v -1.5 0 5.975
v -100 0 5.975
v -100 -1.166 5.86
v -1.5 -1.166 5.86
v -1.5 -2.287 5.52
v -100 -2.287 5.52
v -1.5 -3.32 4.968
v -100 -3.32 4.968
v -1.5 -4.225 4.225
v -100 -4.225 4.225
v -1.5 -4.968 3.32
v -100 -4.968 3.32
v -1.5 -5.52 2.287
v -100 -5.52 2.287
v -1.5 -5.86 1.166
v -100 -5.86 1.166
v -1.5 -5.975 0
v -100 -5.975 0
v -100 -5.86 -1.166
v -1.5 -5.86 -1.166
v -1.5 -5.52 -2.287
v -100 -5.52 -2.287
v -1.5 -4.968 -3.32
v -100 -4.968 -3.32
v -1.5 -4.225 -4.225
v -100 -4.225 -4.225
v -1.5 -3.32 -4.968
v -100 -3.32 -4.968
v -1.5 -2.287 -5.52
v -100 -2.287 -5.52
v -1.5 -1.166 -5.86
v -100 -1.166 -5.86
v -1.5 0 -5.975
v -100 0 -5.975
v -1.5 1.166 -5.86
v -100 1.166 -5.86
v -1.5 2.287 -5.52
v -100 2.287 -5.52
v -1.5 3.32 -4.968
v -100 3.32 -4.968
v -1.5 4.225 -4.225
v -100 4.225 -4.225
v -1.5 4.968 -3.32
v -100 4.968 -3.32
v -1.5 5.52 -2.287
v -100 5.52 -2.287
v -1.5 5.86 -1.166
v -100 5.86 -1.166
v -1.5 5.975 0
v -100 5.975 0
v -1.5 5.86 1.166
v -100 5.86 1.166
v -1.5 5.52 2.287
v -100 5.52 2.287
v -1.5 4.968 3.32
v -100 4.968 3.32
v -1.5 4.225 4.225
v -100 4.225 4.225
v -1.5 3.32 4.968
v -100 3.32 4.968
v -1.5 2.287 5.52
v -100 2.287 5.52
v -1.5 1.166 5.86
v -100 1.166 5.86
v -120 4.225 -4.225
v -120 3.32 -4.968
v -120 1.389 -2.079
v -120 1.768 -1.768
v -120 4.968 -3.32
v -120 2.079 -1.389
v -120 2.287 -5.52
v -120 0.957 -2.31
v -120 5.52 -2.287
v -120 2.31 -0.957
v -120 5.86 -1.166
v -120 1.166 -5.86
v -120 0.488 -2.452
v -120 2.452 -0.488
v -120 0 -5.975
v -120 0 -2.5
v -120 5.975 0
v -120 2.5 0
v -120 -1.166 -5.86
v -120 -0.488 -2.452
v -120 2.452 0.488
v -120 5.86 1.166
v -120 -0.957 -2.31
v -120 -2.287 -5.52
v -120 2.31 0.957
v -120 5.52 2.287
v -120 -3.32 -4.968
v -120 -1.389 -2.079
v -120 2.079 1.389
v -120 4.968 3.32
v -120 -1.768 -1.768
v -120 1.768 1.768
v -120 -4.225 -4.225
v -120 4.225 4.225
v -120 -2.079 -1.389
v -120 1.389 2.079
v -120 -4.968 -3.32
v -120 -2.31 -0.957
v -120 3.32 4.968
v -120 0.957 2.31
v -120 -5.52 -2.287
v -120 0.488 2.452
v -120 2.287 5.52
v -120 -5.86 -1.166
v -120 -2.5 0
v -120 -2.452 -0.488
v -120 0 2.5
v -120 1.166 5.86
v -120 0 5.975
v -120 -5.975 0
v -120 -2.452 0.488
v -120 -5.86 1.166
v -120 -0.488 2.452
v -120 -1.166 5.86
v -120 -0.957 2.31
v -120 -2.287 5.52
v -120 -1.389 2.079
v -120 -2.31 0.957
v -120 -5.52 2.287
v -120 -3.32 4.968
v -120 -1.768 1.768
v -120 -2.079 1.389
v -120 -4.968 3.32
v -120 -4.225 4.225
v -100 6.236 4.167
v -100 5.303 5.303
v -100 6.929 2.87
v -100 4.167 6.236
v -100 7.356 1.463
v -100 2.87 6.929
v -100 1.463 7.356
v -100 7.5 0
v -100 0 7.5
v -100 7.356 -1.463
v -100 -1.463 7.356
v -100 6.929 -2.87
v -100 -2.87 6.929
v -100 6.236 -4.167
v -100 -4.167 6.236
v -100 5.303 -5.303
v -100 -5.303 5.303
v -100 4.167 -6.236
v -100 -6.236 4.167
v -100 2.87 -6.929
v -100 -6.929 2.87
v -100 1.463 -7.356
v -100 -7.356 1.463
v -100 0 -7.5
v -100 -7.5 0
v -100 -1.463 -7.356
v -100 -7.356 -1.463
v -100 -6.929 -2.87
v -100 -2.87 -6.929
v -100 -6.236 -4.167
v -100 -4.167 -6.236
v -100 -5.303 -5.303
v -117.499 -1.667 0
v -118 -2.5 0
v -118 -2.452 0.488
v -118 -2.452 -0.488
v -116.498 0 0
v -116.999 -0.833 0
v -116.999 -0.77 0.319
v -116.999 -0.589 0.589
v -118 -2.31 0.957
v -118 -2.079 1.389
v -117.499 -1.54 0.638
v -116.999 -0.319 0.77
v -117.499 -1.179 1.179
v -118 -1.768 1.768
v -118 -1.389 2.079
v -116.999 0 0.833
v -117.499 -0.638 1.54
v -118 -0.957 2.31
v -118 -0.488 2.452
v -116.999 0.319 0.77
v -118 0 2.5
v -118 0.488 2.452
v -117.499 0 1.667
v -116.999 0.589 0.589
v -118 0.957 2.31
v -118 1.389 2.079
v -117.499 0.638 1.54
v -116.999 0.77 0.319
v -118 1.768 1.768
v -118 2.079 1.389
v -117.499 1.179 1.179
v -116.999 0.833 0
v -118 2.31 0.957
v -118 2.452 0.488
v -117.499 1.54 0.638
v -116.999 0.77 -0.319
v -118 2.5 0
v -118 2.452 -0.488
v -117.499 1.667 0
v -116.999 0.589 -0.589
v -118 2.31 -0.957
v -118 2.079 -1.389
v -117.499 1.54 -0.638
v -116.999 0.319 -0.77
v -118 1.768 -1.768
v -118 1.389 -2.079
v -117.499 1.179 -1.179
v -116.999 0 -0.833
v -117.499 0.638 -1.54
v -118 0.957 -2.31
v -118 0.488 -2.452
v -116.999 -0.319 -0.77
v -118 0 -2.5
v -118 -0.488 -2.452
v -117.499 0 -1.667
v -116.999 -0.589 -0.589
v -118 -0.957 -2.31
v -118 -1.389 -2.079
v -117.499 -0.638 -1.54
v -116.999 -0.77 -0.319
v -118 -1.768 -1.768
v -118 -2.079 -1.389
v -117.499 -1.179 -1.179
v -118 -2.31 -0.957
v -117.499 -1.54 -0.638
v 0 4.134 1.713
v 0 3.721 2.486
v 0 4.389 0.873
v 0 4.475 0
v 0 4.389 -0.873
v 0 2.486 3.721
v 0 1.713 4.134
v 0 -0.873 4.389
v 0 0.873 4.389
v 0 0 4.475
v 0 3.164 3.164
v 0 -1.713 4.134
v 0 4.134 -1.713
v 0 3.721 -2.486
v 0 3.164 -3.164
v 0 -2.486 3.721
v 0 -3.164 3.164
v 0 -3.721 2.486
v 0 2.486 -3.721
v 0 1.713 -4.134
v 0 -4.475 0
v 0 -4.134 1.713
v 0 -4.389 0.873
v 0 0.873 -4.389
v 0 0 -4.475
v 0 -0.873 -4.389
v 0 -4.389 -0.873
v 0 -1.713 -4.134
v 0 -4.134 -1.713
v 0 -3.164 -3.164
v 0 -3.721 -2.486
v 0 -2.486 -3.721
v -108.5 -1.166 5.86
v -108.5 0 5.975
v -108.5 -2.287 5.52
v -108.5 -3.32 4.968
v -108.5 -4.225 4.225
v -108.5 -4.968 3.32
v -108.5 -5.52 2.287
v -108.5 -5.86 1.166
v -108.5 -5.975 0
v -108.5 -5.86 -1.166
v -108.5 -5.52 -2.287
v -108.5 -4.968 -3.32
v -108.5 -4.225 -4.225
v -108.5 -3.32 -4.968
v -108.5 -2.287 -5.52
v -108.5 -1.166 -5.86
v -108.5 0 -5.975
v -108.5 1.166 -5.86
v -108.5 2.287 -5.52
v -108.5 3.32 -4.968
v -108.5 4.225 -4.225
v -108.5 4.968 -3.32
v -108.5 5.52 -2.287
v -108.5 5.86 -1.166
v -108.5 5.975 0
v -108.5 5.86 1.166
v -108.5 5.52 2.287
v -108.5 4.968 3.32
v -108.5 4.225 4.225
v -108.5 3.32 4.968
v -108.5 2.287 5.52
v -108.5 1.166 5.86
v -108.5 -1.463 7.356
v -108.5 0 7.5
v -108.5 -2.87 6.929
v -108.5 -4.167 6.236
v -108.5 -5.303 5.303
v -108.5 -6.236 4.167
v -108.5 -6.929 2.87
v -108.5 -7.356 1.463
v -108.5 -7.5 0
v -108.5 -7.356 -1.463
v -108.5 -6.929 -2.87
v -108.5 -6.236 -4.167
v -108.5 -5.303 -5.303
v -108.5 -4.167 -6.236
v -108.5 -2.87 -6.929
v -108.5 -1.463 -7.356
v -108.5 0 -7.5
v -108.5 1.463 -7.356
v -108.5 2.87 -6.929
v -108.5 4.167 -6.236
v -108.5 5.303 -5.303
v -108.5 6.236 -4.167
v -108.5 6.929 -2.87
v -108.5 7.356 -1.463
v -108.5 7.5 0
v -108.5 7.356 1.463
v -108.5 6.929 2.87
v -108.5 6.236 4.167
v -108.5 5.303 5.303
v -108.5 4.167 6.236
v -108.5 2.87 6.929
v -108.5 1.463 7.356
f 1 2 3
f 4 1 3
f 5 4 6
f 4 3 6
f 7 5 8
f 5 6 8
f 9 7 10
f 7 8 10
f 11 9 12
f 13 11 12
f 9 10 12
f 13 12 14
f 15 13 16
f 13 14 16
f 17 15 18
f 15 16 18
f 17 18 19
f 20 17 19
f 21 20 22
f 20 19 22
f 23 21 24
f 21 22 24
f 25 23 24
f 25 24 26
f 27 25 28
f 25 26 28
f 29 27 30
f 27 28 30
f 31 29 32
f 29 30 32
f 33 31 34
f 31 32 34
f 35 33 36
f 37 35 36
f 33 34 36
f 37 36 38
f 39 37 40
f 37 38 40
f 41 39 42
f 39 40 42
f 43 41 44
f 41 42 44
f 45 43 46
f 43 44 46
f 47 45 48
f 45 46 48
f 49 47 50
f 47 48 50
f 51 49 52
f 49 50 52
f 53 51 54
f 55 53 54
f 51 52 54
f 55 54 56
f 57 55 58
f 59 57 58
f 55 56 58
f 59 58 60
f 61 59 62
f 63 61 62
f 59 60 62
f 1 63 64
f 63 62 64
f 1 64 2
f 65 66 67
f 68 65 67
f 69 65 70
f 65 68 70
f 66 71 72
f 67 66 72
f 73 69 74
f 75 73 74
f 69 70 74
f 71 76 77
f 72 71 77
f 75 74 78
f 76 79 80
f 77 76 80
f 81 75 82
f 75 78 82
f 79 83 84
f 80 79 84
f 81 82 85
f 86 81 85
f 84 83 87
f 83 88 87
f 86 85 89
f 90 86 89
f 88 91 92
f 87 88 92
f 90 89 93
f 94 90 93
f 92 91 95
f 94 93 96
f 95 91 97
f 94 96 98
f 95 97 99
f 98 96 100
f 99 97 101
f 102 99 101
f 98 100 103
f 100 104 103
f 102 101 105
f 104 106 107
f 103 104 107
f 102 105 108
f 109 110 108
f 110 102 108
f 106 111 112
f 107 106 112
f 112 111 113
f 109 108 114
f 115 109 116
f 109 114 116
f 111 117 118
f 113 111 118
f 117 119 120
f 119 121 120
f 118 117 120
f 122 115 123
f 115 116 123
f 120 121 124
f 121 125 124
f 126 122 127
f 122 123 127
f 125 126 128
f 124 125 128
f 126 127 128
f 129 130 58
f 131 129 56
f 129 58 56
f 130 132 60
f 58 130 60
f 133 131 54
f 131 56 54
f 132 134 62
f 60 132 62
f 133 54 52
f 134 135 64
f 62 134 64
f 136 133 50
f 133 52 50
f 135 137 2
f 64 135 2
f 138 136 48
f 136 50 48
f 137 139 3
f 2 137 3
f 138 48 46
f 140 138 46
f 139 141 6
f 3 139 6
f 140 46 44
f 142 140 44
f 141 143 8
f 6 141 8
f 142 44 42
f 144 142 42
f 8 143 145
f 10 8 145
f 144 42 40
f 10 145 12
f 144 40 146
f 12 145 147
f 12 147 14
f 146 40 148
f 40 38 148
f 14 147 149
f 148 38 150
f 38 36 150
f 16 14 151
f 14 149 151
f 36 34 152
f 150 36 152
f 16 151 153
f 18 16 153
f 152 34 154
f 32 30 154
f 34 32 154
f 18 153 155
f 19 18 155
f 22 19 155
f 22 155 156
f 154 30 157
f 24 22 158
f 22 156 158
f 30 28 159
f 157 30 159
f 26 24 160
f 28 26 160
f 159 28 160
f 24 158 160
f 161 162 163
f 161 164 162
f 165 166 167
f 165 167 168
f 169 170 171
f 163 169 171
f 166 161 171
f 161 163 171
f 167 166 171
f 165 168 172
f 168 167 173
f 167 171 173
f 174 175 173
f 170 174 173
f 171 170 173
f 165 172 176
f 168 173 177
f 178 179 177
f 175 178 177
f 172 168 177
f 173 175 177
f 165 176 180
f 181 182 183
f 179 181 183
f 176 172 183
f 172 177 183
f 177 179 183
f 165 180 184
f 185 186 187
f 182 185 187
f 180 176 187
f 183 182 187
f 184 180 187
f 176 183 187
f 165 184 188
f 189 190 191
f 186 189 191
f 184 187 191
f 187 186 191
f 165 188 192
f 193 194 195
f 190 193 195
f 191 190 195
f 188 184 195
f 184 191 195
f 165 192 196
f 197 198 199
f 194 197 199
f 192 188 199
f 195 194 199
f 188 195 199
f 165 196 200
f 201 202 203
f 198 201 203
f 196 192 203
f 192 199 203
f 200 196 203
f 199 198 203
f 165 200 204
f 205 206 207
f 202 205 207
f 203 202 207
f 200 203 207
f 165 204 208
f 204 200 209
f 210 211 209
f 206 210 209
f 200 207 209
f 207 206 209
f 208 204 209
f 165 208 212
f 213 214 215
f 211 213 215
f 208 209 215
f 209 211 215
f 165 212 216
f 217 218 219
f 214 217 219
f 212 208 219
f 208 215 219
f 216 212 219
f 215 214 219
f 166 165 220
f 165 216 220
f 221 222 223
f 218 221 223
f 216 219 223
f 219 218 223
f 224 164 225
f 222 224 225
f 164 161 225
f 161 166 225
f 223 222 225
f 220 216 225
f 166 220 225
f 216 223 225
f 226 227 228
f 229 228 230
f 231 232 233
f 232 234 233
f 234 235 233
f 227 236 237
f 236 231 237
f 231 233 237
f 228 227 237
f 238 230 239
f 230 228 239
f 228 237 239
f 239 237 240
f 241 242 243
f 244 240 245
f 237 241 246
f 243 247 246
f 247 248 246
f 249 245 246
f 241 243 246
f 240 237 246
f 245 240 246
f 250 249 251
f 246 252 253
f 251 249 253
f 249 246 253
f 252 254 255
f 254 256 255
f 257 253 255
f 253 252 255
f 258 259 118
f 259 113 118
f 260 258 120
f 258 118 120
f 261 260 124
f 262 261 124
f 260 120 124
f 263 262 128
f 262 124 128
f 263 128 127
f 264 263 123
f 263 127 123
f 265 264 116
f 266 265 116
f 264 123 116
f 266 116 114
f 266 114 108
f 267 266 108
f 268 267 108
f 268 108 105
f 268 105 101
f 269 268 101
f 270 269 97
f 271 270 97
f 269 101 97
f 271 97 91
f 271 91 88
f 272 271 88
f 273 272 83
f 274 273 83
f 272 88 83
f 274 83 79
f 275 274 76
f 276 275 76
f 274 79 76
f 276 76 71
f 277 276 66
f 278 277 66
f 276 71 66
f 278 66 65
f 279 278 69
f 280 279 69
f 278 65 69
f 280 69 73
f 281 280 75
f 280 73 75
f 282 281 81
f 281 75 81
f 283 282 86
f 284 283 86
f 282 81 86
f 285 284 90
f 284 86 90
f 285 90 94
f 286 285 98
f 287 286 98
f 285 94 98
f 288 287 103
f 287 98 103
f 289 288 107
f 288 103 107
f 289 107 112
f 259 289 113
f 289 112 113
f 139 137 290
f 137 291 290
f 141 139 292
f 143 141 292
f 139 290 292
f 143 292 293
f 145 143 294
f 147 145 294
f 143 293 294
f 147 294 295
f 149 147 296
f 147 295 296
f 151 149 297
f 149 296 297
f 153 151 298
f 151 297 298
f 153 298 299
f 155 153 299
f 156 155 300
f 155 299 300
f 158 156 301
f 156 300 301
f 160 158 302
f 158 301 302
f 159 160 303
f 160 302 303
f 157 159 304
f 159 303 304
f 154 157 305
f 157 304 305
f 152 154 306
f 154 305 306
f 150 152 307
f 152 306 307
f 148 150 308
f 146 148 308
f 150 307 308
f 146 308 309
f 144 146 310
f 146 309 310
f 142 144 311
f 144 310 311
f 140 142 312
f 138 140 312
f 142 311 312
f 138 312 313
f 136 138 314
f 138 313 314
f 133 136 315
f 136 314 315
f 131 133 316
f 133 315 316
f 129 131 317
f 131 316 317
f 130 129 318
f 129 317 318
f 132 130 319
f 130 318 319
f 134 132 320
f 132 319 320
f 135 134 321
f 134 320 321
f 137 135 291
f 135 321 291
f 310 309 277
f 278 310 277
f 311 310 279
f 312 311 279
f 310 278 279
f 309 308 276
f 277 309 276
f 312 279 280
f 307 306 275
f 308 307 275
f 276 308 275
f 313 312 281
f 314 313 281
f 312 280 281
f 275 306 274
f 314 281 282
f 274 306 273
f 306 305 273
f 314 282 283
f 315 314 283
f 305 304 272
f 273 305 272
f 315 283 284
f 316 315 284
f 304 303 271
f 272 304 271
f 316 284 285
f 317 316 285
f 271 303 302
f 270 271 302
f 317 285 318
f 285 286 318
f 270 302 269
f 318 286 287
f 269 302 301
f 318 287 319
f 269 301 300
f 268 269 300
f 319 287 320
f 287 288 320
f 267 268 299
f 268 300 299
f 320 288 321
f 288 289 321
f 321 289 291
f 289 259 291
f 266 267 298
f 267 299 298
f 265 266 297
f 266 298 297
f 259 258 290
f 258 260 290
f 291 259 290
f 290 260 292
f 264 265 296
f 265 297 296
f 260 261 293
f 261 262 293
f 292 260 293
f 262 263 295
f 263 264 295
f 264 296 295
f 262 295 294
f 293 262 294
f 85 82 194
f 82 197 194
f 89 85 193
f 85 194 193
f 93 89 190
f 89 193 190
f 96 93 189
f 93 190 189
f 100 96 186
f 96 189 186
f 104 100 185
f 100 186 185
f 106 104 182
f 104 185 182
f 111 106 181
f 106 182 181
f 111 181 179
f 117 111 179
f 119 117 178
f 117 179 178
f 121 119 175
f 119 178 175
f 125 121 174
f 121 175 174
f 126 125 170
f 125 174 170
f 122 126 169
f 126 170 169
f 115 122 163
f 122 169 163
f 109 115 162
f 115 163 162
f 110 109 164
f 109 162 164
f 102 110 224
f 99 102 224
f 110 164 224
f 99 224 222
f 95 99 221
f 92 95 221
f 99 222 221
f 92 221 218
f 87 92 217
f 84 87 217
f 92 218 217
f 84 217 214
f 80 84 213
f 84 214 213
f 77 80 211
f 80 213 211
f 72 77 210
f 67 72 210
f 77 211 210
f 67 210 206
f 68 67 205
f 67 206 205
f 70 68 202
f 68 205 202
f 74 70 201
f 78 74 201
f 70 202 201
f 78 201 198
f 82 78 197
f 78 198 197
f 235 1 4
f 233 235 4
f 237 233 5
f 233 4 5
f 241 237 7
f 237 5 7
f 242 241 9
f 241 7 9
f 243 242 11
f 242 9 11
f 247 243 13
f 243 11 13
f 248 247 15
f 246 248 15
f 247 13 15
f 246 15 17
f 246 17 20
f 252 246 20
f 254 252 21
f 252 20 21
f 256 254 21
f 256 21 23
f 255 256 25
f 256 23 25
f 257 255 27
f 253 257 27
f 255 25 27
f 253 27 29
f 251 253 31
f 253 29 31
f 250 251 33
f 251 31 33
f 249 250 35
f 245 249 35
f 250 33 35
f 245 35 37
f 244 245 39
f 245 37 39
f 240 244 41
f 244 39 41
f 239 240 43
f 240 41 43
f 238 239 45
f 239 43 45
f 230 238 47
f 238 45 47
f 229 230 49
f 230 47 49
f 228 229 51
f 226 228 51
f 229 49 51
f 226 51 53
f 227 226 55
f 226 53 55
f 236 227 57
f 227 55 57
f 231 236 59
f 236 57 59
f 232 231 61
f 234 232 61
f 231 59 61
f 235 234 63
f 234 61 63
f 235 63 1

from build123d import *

# Parameters (mm, degrees)
F3_D     = 5
F3_DEPTH = 2
F3_TIP   = 1.5021515476
F4_SIZE  = 1.5


with BuildPart() as f1:
    # F0 (on Front) → F1 (revolve)
    with BuildSketch(Plane.XZ):
        Polygon((-120, 0), (0, 0), (0, 5.975), (-100, 5.975), (-100, 7.5), (-108.5, 7.5), (-108.5, 5.975), (-120, 5.975), align=None)
    revolve(axis=Axis((-60, 0, 0), (1, 0, 0)))

    # F3
    with Locations(Plane(origin=(-120, 0, 0), x_dir=(0, -1, 0), z_dir=(-1, 0, 0))):
        with Locations((0, 0)):
            Hole(F3_D / 2, depth=F3_DEPTH)
            with Locations((0, 0, -(F3_DEPTH + F3_TIP / 2))):  # 118° drill point
                Cone(0, F3_D / 2, F3_TIP, mode=Mode.SUBTRACT)

    # F4
    f4_edges = [f1.edges().sort_by_distance(p)[0] for p in [
        (0, 0, -5.975),
    ]]
    chamfer(f4_edges, length=F4_SIZE)


solid = f1.part
